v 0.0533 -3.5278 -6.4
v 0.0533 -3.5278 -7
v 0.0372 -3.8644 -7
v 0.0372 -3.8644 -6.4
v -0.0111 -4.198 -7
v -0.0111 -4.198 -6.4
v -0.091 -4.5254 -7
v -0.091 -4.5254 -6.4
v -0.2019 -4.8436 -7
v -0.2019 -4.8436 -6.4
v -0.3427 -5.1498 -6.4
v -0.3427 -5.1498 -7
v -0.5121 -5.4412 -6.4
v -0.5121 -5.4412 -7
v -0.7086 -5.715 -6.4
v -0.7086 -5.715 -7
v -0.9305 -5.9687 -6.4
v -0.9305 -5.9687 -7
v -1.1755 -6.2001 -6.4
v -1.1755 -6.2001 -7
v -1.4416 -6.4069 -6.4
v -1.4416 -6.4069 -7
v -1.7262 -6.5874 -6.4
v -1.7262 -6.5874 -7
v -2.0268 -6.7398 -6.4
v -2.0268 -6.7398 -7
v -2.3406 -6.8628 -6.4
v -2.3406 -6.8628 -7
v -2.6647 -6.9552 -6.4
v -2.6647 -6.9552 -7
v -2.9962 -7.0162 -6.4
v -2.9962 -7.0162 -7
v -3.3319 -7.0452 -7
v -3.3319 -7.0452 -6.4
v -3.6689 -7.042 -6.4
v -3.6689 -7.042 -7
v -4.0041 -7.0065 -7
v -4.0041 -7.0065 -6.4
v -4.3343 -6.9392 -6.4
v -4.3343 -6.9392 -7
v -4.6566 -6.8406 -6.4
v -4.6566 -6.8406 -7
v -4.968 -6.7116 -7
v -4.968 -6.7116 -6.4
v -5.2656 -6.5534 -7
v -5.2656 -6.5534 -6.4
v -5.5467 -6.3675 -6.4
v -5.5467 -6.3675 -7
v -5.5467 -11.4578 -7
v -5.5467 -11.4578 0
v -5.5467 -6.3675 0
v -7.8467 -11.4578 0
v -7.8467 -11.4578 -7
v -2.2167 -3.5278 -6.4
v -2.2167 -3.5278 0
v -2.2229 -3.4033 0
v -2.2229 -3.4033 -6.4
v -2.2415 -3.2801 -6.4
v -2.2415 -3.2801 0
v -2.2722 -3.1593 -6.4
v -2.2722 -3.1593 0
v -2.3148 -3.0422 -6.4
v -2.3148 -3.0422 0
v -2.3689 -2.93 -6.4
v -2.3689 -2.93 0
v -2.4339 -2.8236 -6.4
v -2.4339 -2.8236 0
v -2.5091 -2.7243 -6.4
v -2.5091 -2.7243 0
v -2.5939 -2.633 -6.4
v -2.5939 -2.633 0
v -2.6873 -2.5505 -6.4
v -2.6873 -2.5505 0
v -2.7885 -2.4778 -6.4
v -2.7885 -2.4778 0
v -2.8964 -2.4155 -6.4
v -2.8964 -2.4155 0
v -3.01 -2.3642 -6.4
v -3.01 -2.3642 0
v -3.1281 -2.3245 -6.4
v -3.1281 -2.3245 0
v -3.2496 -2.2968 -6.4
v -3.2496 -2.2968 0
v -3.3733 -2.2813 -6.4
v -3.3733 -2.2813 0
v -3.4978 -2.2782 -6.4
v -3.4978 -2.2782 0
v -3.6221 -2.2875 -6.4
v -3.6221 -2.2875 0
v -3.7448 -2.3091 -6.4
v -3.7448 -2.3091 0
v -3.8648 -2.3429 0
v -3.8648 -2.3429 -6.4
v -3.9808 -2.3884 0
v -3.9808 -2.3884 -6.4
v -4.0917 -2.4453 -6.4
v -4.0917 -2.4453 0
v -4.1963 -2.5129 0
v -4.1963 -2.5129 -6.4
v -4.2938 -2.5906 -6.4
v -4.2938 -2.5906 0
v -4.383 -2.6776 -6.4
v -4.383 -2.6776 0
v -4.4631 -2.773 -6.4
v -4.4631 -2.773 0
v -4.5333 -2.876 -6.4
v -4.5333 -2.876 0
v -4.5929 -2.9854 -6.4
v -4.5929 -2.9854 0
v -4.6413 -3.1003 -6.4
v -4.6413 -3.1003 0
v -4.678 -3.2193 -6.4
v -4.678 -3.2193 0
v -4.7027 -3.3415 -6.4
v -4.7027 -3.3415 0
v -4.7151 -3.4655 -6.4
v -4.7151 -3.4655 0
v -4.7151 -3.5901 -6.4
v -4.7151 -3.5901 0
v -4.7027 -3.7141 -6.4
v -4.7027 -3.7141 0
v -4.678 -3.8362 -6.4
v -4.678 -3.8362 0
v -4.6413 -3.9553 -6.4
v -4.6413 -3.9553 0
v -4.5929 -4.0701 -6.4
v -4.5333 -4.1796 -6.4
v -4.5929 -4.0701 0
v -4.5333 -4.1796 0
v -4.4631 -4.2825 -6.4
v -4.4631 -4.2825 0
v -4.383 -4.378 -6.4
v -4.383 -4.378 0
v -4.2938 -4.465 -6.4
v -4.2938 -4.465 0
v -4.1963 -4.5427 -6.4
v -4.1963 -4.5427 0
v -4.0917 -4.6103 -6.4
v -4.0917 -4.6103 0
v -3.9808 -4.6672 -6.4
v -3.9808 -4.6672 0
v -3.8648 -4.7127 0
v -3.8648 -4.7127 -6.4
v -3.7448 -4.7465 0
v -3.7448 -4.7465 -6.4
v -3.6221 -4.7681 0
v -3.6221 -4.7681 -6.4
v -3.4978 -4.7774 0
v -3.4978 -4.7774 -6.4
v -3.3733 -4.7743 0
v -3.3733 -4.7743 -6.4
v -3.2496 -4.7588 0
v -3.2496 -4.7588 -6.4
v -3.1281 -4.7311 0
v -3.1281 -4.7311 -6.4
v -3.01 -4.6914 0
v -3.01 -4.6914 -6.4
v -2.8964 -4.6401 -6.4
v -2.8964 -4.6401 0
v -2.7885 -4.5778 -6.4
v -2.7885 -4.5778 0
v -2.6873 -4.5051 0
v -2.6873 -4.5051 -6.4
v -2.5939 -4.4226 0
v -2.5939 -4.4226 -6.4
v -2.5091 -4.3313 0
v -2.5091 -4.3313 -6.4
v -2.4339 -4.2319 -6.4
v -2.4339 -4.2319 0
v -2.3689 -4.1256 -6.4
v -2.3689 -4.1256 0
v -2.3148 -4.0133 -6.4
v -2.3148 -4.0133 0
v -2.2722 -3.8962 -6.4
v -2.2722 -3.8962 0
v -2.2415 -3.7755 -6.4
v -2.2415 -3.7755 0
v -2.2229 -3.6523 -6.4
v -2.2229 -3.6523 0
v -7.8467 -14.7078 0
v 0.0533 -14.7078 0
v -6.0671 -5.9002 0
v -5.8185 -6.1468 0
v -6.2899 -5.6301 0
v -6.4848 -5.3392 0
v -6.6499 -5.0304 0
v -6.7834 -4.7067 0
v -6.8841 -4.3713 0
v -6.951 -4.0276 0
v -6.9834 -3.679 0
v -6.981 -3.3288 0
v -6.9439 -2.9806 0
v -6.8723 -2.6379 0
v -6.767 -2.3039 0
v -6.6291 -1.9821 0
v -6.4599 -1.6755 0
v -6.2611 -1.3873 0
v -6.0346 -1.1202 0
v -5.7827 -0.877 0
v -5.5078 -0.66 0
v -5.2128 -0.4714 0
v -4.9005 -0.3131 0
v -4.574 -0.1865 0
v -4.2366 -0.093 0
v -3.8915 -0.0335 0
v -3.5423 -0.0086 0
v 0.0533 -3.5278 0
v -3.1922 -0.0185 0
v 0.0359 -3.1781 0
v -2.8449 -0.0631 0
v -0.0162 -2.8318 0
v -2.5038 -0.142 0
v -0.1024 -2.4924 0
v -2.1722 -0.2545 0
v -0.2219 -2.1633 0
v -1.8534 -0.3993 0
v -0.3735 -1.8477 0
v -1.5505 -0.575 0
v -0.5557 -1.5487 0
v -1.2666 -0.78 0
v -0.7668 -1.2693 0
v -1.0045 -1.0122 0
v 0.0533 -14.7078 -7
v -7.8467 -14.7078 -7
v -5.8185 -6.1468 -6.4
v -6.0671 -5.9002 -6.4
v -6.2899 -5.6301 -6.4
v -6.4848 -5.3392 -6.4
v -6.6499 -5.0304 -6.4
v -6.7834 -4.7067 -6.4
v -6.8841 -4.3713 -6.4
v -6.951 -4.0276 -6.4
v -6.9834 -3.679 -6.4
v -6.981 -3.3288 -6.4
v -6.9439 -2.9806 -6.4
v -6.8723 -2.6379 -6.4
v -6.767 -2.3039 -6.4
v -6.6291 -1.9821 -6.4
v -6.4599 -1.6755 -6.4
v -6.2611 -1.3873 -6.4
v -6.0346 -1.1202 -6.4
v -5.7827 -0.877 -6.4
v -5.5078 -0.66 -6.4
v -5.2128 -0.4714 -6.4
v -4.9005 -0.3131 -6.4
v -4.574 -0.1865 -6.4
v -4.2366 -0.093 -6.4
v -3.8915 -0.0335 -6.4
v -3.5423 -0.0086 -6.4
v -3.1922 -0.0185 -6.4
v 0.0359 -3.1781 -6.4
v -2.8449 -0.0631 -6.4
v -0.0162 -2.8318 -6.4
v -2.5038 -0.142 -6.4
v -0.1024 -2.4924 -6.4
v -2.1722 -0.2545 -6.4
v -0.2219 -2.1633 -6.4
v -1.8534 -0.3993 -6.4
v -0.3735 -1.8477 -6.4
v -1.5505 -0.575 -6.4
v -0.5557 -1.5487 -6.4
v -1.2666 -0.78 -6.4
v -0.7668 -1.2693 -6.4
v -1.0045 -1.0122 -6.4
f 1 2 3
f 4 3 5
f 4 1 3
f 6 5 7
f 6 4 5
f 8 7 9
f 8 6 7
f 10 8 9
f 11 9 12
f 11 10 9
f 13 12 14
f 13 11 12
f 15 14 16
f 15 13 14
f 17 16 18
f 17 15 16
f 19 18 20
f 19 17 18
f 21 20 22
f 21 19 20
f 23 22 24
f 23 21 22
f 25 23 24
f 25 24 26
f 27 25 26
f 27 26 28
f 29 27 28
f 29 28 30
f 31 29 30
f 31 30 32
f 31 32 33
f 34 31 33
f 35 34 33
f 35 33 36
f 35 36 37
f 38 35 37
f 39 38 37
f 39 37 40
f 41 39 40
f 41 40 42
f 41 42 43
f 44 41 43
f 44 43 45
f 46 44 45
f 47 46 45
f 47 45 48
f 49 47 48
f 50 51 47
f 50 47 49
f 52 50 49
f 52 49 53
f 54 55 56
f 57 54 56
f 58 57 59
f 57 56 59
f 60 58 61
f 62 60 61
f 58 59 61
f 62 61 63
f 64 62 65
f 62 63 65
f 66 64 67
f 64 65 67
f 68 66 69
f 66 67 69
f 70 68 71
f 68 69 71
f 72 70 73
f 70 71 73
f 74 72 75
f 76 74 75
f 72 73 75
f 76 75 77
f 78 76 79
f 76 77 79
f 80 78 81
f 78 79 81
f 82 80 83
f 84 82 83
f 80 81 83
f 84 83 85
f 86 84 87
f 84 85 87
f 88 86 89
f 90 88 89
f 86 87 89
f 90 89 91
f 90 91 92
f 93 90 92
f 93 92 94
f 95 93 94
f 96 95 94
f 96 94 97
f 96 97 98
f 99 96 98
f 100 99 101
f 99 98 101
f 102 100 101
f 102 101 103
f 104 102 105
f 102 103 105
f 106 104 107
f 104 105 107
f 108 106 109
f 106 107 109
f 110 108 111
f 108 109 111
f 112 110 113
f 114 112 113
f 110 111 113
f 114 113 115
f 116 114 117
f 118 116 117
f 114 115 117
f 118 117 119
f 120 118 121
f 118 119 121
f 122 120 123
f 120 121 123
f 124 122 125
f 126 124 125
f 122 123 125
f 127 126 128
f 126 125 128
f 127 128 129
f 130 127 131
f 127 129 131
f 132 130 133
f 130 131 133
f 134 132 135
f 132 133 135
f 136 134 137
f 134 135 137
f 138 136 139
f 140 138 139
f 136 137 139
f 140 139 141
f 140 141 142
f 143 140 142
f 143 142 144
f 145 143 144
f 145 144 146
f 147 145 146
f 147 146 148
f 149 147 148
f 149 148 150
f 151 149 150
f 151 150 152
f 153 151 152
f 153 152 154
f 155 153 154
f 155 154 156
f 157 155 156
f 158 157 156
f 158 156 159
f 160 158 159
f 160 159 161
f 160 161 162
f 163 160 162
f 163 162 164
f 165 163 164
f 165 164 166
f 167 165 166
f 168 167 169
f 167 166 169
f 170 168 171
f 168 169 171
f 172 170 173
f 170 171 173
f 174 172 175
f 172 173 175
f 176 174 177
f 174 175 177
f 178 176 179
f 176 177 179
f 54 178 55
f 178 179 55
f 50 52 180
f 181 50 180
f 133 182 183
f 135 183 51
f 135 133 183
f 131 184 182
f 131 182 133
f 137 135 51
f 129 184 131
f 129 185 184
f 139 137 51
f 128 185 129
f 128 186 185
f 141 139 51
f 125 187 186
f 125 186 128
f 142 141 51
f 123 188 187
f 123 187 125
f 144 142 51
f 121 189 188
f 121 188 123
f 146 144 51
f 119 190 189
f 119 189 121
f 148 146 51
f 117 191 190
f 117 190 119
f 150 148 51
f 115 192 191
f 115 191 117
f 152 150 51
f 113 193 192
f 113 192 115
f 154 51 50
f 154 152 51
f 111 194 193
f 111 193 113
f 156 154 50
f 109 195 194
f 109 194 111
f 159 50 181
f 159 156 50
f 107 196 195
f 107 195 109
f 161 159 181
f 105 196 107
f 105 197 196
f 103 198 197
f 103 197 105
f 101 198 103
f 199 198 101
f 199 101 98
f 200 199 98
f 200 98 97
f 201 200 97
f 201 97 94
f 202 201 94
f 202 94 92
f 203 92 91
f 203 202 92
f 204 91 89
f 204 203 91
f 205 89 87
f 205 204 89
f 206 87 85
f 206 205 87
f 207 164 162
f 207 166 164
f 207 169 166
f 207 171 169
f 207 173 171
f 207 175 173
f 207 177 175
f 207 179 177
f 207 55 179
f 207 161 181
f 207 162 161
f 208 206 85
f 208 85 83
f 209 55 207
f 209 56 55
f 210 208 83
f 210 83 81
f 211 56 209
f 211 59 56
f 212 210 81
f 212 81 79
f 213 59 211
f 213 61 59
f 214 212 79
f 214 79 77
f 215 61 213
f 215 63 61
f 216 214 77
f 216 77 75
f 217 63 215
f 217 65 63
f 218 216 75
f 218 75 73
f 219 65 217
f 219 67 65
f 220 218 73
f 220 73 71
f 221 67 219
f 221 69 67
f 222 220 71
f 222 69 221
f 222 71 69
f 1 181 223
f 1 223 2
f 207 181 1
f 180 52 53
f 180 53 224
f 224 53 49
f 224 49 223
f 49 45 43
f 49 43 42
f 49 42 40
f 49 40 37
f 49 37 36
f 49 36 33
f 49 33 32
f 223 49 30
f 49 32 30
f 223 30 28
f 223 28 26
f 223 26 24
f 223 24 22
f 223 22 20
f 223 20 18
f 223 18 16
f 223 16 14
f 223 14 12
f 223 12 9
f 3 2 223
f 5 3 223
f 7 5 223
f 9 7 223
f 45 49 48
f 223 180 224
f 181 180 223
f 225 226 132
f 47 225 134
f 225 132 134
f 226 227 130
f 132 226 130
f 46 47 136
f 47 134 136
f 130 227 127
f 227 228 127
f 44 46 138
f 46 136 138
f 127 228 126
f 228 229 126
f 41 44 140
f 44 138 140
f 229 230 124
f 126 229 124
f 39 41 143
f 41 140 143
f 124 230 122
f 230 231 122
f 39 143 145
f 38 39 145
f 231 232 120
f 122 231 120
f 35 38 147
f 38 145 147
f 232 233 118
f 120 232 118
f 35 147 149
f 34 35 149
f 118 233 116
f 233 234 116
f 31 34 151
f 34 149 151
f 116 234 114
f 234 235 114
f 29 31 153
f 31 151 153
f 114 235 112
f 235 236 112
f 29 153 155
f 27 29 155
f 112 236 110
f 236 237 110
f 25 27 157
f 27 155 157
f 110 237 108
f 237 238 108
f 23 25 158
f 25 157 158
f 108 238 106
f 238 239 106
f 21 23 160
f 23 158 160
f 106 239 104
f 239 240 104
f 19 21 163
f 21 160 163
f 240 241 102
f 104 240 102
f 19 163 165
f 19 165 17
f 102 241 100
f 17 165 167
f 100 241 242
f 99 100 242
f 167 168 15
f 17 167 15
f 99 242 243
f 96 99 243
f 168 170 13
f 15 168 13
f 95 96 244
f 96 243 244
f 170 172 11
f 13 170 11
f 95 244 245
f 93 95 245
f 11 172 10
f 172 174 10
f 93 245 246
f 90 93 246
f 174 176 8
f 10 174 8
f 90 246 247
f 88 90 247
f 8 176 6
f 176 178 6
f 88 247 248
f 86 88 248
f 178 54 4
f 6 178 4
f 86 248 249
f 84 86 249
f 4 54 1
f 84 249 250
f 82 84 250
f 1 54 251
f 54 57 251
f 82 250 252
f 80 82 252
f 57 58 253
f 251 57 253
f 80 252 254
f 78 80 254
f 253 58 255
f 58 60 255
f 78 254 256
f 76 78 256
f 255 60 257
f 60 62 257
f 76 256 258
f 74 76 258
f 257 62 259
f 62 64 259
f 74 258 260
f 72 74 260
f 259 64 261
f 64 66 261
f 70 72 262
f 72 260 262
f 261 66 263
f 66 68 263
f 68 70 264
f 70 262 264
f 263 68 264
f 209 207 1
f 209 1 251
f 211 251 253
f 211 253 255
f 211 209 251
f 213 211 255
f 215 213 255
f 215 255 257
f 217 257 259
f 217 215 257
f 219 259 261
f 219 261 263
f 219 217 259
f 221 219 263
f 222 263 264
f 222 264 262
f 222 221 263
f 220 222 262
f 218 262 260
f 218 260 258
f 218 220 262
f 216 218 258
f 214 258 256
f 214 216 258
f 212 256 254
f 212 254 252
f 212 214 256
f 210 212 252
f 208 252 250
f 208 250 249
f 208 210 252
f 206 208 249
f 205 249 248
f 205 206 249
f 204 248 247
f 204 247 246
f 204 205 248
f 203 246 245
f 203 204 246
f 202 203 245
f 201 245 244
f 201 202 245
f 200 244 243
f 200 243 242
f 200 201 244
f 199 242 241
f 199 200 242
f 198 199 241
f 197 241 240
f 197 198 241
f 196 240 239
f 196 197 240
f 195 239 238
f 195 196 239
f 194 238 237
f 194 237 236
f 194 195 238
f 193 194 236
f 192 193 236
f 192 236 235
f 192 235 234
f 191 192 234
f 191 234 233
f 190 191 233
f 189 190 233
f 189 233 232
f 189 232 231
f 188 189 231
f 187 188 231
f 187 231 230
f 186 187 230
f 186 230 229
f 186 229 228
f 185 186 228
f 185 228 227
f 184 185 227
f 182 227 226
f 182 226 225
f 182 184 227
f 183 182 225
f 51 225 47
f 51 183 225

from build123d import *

# Parameters (mm, degrees)
F1_DEPTH = 7
F0_R     = 1.25
F2_DEPTH = 6.4


with BuildPart() as f1:
    # F0 (on Top) → F1 (new body)
    with BuildSketch(Plane.XY):
        with BuildLine():
            Line((0.053334, -14.707793), (0.053334, -3.527793))
            ThreePointArc((0.053334, -3.527793), (-1.874686, -6.66722), (-5.546666, -6.367512))
            Line((-5.546666, -6.367512), (-5.546666, -11.457793))
            Line((-5.546666, -11.457793), (-7.846666, -11.457793))
            Line((-7.846666, -11.457793), (-7.846666, -14.707793))
            Line((-7.846666, -14.707793), (-3.466666, -14.707793))
            Line((-3.466666, -14.707793), (0.053334, -14.707793))
        make_face()
    extrude(amount=-F1_DEPTH)

    # F0 (on Top) → F2 (join)
    with BuildSketch(Plane.XY):
        with BuildLine():
            ThreePointArc((-5.546666, -6.367512), (-1.874686, -6.66722), (0.053334, -3.527793))
            ThreePointArc((0.053334, -3.527793), (-5.058645, -0.388367), (-5.546666, -6.367512))
        make_face()
        with Locations((-3.466666, -3.527793)):
            Circle(F0_R, mode=Mode.SUBTRACT)
    extrude(amount=-F2_DEPTH)


solid = f1.part
